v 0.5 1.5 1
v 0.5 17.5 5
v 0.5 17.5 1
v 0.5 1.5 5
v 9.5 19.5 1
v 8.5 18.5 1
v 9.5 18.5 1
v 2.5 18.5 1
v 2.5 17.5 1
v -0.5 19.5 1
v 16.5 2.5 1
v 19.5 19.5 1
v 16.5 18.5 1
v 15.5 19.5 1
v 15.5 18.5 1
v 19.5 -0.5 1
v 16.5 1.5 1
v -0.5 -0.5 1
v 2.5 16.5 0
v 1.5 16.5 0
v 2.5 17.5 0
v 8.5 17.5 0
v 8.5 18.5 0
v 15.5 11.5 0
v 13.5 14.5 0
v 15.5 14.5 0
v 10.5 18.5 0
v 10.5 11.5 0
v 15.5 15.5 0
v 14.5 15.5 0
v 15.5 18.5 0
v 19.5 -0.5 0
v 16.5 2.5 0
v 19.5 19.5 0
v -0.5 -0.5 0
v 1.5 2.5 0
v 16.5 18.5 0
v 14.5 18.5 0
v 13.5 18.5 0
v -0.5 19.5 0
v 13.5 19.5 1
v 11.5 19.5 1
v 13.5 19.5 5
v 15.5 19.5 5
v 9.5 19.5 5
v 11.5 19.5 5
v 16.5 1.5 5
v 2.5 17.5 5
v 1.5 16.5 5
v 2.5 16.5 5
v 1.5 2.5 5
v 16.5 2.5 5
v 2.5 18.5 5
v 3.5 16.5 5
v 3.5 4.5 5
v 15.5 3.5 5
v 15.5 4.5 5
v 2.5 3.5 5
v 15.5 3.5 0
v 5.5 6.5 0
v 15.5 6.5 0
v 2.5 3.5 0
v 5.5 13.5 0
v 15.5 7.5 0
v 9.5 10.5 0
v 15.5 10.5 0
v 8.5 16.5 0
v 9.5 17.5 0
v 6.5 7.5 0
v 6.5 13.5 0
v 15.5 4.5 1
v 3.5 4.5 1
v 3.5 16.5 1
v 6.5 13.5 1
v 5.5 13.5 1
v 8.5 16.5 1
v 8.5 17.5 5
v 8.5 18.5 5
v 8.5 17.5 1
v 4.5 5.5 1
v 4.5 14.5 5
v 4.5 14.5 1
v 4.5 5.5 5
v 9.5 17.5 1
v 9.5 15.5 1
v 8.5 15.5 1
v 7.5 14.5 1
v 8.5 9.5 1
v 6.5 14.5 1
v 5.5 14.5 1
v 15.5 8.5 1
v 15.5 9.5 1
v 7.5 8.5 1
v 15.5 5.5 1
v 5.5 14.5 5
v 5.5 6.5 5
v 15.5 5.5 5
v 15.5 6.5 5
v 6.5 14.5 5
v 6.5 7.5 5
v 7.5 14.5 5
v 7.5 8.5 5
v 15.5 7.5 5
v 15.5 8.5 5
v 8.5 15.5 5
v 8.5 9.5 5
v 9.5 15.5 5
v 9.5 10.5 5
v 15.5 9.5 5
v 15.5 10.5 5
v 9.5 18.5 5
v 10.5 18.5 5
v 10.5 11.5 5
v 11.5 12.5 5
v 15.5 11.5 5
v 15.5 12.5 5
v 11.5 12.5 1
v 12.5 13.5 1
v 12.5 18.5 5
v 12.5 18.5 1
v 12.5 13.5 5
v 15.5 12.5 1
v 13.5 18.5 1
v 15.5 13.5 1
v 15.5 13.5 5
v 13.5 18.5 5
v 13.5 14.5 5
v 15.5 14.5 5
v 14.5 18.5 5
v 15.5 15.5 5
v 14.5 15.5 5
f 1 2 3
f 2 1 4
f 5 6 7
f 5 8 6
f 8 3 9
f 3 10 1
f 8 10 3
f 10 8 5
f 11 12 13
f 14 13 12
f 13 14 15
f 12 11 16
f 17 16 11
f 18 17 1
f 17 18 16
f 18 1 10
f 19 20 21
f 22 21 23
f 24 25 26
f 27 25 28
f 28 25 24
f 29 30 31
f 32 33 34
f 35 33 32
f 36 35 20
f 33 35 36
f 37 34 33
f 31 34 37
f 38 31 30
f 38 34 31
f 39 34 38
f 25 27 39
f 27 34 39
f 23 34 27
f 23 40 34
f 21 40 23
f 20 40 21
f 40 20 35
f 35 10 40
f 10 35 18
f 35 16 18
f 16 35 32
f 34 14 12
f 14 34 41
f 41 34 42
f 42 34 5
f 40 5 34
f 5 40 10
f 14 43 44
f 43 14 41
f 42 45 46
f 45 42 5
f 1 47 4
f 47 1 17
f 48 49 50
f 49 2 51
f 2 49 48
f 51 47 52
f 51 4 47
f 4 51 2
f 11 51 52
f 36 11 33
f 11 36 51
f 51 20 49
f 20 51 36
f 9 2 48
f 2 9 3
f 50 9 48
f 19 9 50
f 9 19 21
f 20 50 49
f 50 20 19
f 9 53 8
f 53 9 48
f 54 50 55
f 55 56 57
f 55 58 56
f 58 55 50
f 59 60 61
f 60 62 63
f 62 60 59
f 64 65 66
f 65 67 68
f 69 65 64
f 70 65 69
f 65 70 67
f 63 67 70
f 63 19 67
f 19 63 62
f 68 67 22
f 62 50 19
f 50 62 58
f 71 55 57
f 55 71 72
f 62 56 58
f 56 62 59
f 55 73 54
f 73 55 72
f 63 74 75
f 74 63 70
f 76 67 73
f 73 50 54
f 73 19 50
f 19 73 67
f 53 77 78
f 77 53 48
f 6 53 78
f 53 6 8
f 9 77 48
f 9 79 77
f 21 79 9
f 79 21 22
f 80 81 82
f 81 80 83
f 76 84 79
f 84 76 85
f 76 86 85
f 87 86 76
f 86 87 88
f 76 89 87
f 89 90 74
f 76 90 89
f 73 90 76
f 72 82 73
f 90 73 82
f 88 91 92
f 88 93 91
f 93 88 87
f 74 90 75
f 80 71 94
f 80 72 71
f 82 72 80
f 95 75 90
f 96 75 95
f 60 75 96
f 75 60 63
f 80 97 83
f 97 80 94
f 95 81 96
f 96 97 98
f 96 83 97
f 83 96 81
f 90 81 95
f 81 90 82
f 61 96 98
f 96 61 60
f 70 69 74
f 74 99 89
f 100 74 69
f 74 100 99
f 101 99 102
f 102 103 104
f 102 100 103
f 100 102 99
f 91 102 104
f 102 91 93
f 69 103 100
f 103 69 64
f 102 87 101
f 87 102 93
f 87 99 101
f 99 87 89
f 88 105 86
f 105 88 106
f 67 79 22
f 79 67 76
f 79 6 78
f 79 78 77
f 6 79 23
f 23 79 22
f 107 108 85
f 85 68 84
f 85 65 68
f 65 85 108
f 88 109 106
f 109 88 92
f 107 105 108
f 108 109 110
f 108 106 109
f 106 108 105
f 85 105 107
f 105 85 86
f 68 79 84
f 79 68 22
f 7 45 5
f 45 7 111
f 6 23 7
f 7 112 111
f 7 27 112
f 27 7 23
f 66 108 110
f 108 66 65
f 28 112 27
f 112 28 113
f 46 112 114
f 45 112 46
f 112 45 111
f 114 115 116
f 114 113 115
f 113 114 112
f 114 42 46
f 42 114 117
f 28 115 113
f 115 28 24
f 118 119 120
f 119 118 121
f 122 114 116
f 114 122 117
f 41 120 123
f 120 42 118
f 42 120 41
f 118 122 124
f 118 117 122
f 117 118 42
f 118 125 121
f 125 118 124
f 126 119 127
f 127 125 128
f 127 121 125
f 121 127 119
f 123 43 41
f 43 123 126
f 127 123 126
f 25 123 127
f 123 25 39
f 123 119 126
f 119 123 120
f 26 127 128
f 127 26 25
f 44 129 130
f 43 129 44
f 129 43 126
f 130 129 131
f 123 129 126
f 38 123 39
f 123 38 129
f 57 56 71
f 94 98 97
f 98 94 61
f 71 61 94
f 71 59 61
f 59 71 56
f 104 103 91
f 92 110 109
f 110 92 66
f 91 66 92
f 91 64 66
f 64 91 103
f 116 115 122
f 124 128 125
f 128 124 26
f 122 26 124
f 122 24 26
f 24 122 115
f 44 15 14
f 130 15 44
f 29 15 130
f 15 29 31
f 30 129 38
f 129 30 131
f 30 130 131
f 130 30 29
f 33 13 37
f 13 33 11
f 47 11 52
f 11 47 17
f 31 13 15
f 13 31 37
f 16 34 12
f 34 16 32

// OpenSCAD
union() {
    translate([0, 0, 0.5]) cube([1, 1, 1], center=true);
    translate([0, 1, 0.5]) cube([1, 1, 1], center=true);
    translate([0, 2, 0.5]) cube([1, 1, 1], center=true);
    translate([0, 3, 0.5]) cube([1, 1, 1], center=true);
    translate([0, 4, 0.5]) cube([1, 1, 1], center=true);
    translate([0, 5, 0.5]) cube([1, 1, 1], center=true);
    translate([0, 6, 0.5]) cube([1, 1, 1], center=true);
    translate([0, 7, 0.5]) cube([1, 1, 1], center=true);
    translate([0, 8, 0.5]) cube([1, 1, 1], center=true);
    translate([0, 9, 0.5]) cube([1, 1, 1], center=true);
    translate([0, 10, 0.5]) cube([1, 1, 1], center=true);
    translate([0, 11, 0.5]) cube([1, 1, 1], center=true);
    translate([0, 12, 0.5]) cube([1, 1, 1], center=true);
    translate([0, 13, 0.5]) cube([1, 1, 1], center=true);
    translate([0, 14, 0.5]) cube([1, 1, 1], center=true);
    translate([0, 15, 0.5]) cube([1, 1, 1], center=true);
    translate([0, 16, 0.5]) cube([1, 1, 1], center=true);
    translate([0, 17, 0.5]) cube([1, 1, 1], center=true);
    translate([0, 18, 0.5]) cube([1, 1, 1], center=true);
    translate([0, 19, 0.5]) cube([1, 1, 1], center=true);
    translate([1, 0, 0.5]) cube([1, 1, 1], center=true);
    translate([1, 1, 0.5]) cube([1, 1, 1], center=true);
    translate([1, 2, 2.5]) cube([1, 1, 5], center=true);
    translate([1, 3, 2.5]) cube([1, 1, 5], center=true);
    translate([1, 4, 2.5]) cube([1, 1, 5], center=true);
    translate([1, 5, 2.5]) cube([1, 1, 5], center=true);
    translate([1, 6, 2.5]) cube([1, 1, 5], center=true);
    translate([1, 7, 2.5]) cube([1, 1, 5], center=true);
    translate([1, 8, 2.5]) cube([1, 1, 5], center=true);
    translate([1, 9, 2.5]) cube([1, 1, 5], center=true);
    translate([1, 10, 2.5]) cube([1, 1, 5], center=true);
    translate([1, 11, 2.5]) cube([1, 1, 5], center=true);
    translate([1, 12, 2.5]) cube([1, 1, 5], center=true);
    translate([1, 13, 2.5]) cube([1, 1, 5], center=true);
    translate([1, 14, 2.5]) cube([1, 1, 5], center=true);
    translate([1, 15, 2.5]) cube([1, 1, 5], center=true);
    translate([1, 16, 2.5]) cube([1, 1, 5], center=true);
    translate([1, 17, 2.5]) cube([1, 1, 5], center=true);
    translate([1, 18, 0.5]) cube([1, 1, 1], center=true);
    translate([1, 19, 0.5]) cube([1, 1, 1], center=true);
    translate([2, 0, 0.5]) cube([1, 1, 1], center=true);
    translate([2, 1, 0.5]) cube([1, 1, 1], center=true);
    translate([2, 2, 2.5]) cube([1, 1, 5], center=true);
    translate([2, 17, 2.5]) cube([1, 1, 5], center=true);
    translate([2, 18, 0.5]) cube([1, 1, 1], center=true);
    translate([2, 19, 0.5]) cube([1, 1, 1], center=true);
    translate([3, 0, 0.5]) cube([1, 1, 1], center=true);
    translate([3, 1, 0.5]) cube([1, 1, 1], center=true);
    translate([3, 2, 2.5]) cube([1, 1, 5], center=true);
    translate([3, 4, 2.5]) cube([1, 1, 5], center=true);
    translate([3, 5, 2.5]) cube([1, 1, 5], center=true);
    translate([3, 6, 2.5]) cube([1, 1, 5], center=true);
    translate([3, 7, 2.5]) cube([1, 1, 5], center=true);
    translate([3, 8, 2.5]) cube([1, 1, 5], center=true);
    translate([3, 9, 2.5]) cube([1, 1, 5], center=true);
    translate([3, 10, 2.5]) cube([1, 1, 5], center=true);
    translate([3, 11, 2.5]) cube([1, 1, 5], center=true);
    translate([3, 12, 2.5]) cube([1, 1, 5], center=true);
    translate([3, 13, 2.5]) cube([1, 1, 5], center=true);
    translate([3, 14, 2.5]) cube([1, 1, 5], center=true);
    translate([3, 15, 2.5]) cube([1, 1, 5], center=true);
    translate([3, 16, 2.5]) cube([1, 1, 5], center=true);
    translate([3, 18, 2.5]) cube([1, 1, 5], center=true);
    translate([3, 19, 0.5]) cube([1, 1, 1], center=true);
    translate([4, 0, 0.5]) cube([1, 1, 1], center=true);
    translate([4, 1, 0.5]) cube([1, 1, 1], center=true);
    translate([4, 2, 2.5]) cube([1, 1, 5], center=true);
    translate([4, 4, 2.5]) cube([1, 1, 5], center=true);
    translate([4, 5, 0.5]) cube([1, 1, 1], center=true);
    translate([4, 6, 0.5]) cube([1, 1, 1], center=true);
    translate([4, 7, 0.5]) cube([1, 1, 1], center=true);
    translate([4, 8, 0.5]) cube([1, 1, 1], center=true);
    translate([4, 9, 0.5]) cube([1, 1, 1], center=true);
    translate([4, 10, 0.5]) cube([1, 1, 1], center=true);
    translate([4, 11, 0.5]) cube([1, 1, 1], center=true);
    translate([4, 12, 0.5]) cube([1, 1, 1], center=true);
    translate([4, 13, 0.5]) cube([1, 1, 1], center=true);
    translate([4, 14, 0.5]) cube([1, 1, 1], center=true);
    translate([4, 15, 0.5]) cube([1, 1, 1], center=true);
    translate([4, 16, 0.5]) cube([1, 1, 1], center=true);
    translate([4, 18, 2.5]) cube([1, 1, 5], center=true);
    translate([4, 19, 0.5]) cube([1, 1, 1], center=true);
    translate([5, 0, 0.5]) cube([1, 1, 1], center=true);
    translate([5, 1, 0.5]) cube([1, 1, 1], center=true);
    translate([5, 2, 2.5]) cube([1, 1, 5], center=true);
    translate([5, 4, 2.5]) cube([1, 1, 5], center=true);
    translate([5, 5, 0.5]) cube([1, 1, 1], center=true);
    translate([5, 6, 2.5]) cube([1, 1, 5], center=true);
    translate([5, 7, 2.5]) cube([1, 1, 5], center=true);
    translate([5, 8, 2.5]) cube([1, 1, 5], center=true);
    translate([5, 9, 2.5]) cube([1, 1, 5], center=true);
    translate([5, 10, 2.5]) cube([1, 1, 5], center=true);
    translate([5, 11, 2.5]) cube([1, 1, 5], center=true);
    translate([5, 12, 2.5]) cube([1, 1, 5], center=true);
    translate([5, 13, 2.5]) cube([1, 1, 5], center=true);
    translate([5, 14, 2.5]) cube([1, 1, 5], center=true);
    translate([5, 15, 0.5]) cube([1, 1, 1], center=true);
    translate([5, 16, 0.5]) cube([1, 1, 1], center=true);
    translate([5, 18, 2.5]) cube([1, 1, 5], center=true);
    translate([5, 19, 0.5]) cube([1, 1, 1], center=true);
    translate([6, 0, 0.5]) cube([1, 1, 1], center=true);
    translate([6, 1, 0.5]) cube([1, 1, 1], center=true);
    translate([6, 2, 2.5]) cube([1, 1, 5], center=true);
    translate([6, 4, 2.5]) cube([1, 1, 5], center=true);
    translate([6, 5, 0.5]) cube([1, 1, 1], center=true);
    translate([6, 6, 2.5]) cube([1, 1, 5], center=true);
    translate([6, 14, 0.5]) cube([1, 1, 1], center=true);
    translate([6, 15, 0.5]) cube([1, 1, 1], center=true);
    translate([6, 16, 0.5]) cube([1, 1, 1], center=true);
    translate([6, 18, 2.5]) cube([1, 1, 5], center=true);
    translate([6, 19, 0.5]) cube([1, 1, 1], center=true);
    translate([7, 0, 0.5]) cube([1, 1, 1], center=true);
    translate([7, 1, 0.5]) cube([1, 1, 1], center=true);
    translate([7, 2, 2.5]) cube([1, 1, 5], center=true);
    translate([7, 4, 2.5]) cube([1, 1, 5], center=true);
    translate([7, 5, 0.5]) cube([1, 1, 1], center=true);
    translate([7, 6, 2.5]) cube([1, 1, 5], center=true);
    translate([7, 8, 2.5]) cube([1, 1, 5], center=true);
    translate([7, 9, 2.5]) cube([1, 1, 5], center=true);
    translate([7, 10, 2.5]) cube([1, 1, 5], center=true);
    translate([7, 11, 2.5]) cube([1, 1, 5], center=true);
    translate([7, 12, 2.5]) cube([1, 1, 5], center=true);
    translate([7, 13, 2.5]) cube([1, 1, 5], center=true);
    translate([7, 14, 2.5]) cube([1, 1, 5], center=true);
    translate([7, 15, 0.5]) cube([1, 1, 1], center=true);
    translate([7, 16, 0.5]) cube([1, 1, 1], center=true);
    translate([7, 18, 2.5]) cube([1, 1, 5], center=true);
    translate([7, 19, 0.5]) cube([1, 1, 1], center=true);
    translate([8, 0, 0.5]) cube([1, 1, 1], center=true);
    translate([8, 1, 0.5]) cube([1, 1, 1], center=true);
    translate([8, 2, 2.5]) cube([1, 1, 5], center=true);
    translate([8, 4, 2.5]) cube([1, 1, 5], center=true);
    translate([8, 5, 0.5]) cube([1, 1, 1], center=true);
    translate([8, 6, 2.5]) cube([1, 1, 5], center=true);
    translate([8, 8, 2.5]) cube([1, 1, 5], center=true);
    translate([8, 9, 0.5]) cube([1, 1, 1], center=true);
    translate([8, 10, 0.5]) cube([1, 1, 1], center=true);
    translate([8, 11, 0.5]) cube([1, 1, 1], center=true);
    translate([8, 12, 0.5]) cube([1, 1, 1], center=true);
    translate([8, 13, 0.5]) cube([1, 1, 1], center=true);
    translate([8, 14, 0.5]) cube([1, 1, 1], center=true);
    translate([8, 15, 0.5]) cube([1, 1, 1], center=true);
    translate([8, 16, 0.5]) cube([1, 1, 1], center=true);
    translate([8, 18, 2.5]) cube([1, 1, 5], center=true);
    translate([8, 19, 0.5]) cube([1, 1, 1], center=true);
    translate([9, 0, 0.5]) cube([1, 1, 1], center=true);
    translate([9, 1, 0.5]) cube([1, 1, 1], center=true);
    translate([9, 2, 2.5]) cube([1, 1, 5], center=true);
    translate([9, 4, 2.5]) cube([1, 1, 5], center=true);
    translate([9, 5, 0.5]) cube([1, 1, 1], center=true);
    translate([9, 6, 2.5]) cube([1, 1, 5], center=true);
    translate([9, 8, 2.5]) cube([1, 1, 5], center=true);
    translate([9, 9, 0.5]) cube([1, 1, 1], center=true);
    translate([9, 10, 2.5]) cube([1, 1, 5], center=true);
    translate([9, 11, 2.5]) cube([1, 1, 5], center=true);
    translate([9, 12, 2.5]) cube([1, 1, 5], center=true);
    translate([9, 13, 2.5]) cube([1, 1, 5], center=true);
    translate([9, 14, 2.5]) cube([1, 1, 5], center=true);
    translate([9, 15, 2.5]) cube([1, 1, 5], center=true);
    translate([9, 16, 0.5]) cube([1, 1, 1], center=true);
    translate([9, 17, 0.5]) cube([1, 1, 1], center=true);
    translate([9, 19, 0.5]) cube([1, 1, 1], center=true);
    translate([10, 0, 0.5]) cube([1, 1, 1], center=true);
    translate([10, 1, 0.5]) cube([1, 1, 1], center=true);
    translate([10, 2, 2.5]) cube([1, 1, 5], center=true);
    translate([10, 4, 2.5]) cube([1, 1, 5], center=true);
    translate([10, 5, 0.5]) cube([1, 1, 1], center=true);
    translate([10, 6, 2.5]) cube([1, 1, 5], center=true);
    translate([10, 8, 2.5]) cube([1, 1, 5], center=true);
    translate([10, 9, 0.5]) cube([1, 1, 1], center=true);
    translate([10, 10, 2.5]) cube([1, 1, 5], center=true);
    translate([10, 19, 2.5]) cube([1, 1, 5], center=true);
    translate([11, 0, 0.5]) cube([1, 1, 1], center=true);
    translate([11, 1, 0.5]) cube([1, 1, 1], center=true);
    translate([11, 2, 2.5]) cube([1, 1, 5], center=true);
    translate([11, 4, 2.5]) cube([1, 1, 5], center=true);
    translate([11, 5, 0.5]) cube([1, 1, 1], center=true);
    translate([11, 6, 2.5]) cube([1, 1, 5], center=true);
    translate([11, 8, 2.5]) cube([1, 1, 5], center=true);
    translate([11, 9, 0.5]) cube([1, 1, 1], center=true);
    translate([11, 10, 2.5]) cube([1, 1, 5], center=true);
    translate([11, 12, 2.5]) cube([1, 1, 5], center=true);
    translate([11, 13, 2.5]) cube([1, 1, 5], center=true);
    translate([11, 14, 2.5]) cube([1, 1, 5], center=true);
    translate([11, 15, 2.5]) cube([1, 1, 5], center=true);
    translate([11, 16, 2.5]) cube([1, 1, 5], center=true);
    translate([11, 17, 2.5]) cube([1, 1, 5], center=true);
    translate([11, 18, 2.5]) cube([1, 1, 5], center=true);
    translate([11, 19, 2.5]) cube([1, 1, 5], center=true);
    translate([12, 0, 0.5]) cube([1, 1, 1], center=true);
    translate([12, 1, 0.5]) cube([1, 1, 1], center=true);
    translate([12, 2, 2.5]) cube([1, 1, 5], center=true);
    translate([12, 4, 2.5]) cube([1, 1, 5], center=true);
    translate([12, 5, 0.5]) cube([1, 1, 1], center=true);
    translate([12, 6, 2.5]) cube([1, 1, 5], center=true);
    translate([12, 8, 2.5]) cube([1, 1, 5], center=true);
    translate([12, 9, 0.5]) cube([1, 1, 1], center=true);
    translate([12, 10, 2.5]) cube([1, 1, 5], center=true);
    translate([12, 12, 2.5]) cube([1, 1, 5], center=true);
    translate([12, 13, 0.5]) cube([1, 1, 1], center=true);
    translate([12, 14, 0.5]) cube([1, 1, 1], center=true);
    translate([12, 15, 0.5]) cube([1, 1, 1], center=true);
    translate([12, 16, 0.5]) cube([1, 1, 1], center=true);
    translate([12, 17, 0.5]) cube([1, 1, 1], center=true);
    translate([12, 18, 0.5]) cube([1, 1, 1], center=true);
    translate([12, 19, 0.5]) cube([1, 1, 1], center=true);
    translate([13, 0, 0.5]) cube([1, 1, 1], center=true);
    translate([13, 1, 0.5]) cube([1, 1, 1], center=true);
    translate([13, 2, 2.5]) cube([1, 1, 5], center=true);
    translate([13, 4, 2.5]) cube([1, 1, 5], center=true);
    translate([13, 5, 0.5]) cube([1, 1, 1], center=true);
    translate([13, 6, 2.5]) cube([1, 1, 5], center=true);
    translate([13, 8, 2.5]) cube([1, 1, 5], center=true);
    translate([13, 9, 0.5]) cube([1, 1, 1], center=true);
    translate([13, 10, 2.5]) cube([1, 1, 5], center=true);
    translate([13, 12, 2.5]) cube([1, 1, 5], center=true);
    translate([13, 13, 0.5]) cube([1, 1, 1], center=true);
    translate([13, 14, 2.5]) cube([1, 1, 5], center=true);
    translate([13, 15, 2.5]) cube([1, 1, 5], center=true);
    translate([13, 16, 2.5]) cube([1, 1, 5], center=true);
    translate([13, 17, 2.5]) cube([1, 1, 5], center=true);
    translate([13, 18, 2.5]) cube([1, 1, 5], center=true);
    translate([13, 19, 0.5]) cube([1, 1, 1], center=true);
    translate([14, 0, 0.5]) cube([1, 1, 1], center=true);
    translate([14, 1, 0.5]) cube([1, 1, 1], center=true);
    translate([14, 2, 2.5]) cube([1, 1, 5], center=true);
    translate([14, 4, 2.5]) cube([1, 1, 5], center=true);
    translate([14, 5, 0.5]) cube([1, 1, 1], center=true);
    translate([14, 6, 2.5]) cube([1, 1, 5], center=true);
    translate([14, 8, 2.5]) cube([1, 1, 5], center=true);
    translate([14, 9, 0.5]) cube([1, 1, 1], center=true);
    translate([14, 10, 2.5]) cube([1, 1, 5], center=true);
    translate([14, 12, 2.5]) cube([1, 1, 5], center=true);
    translate([14, 13, 0.5]) cube([1, 1, 1], center=true);
    translate([14, 14, 2.5]) cube([1, 1, 5], center=true);
    translate([14, 19, 2.5]) cube([1, 1, 5], center=true);
    translate([15, 0, 0.5]) cube([1, 1, 1], center=true);
    translate([15, 1, 0.5]) cube([1, 1, 1], center=true);
    translate([15, 2, 2.5]) cube([1, 1, 5], center=true);
    translate([15, 4, 2.5]) cube([1, 1, 5], center=true);
    translate([15, 5, 0.5]) cube([1, 1, 1], center=true);
    translate([15, 6, 2.5]) cube([1, 1, 5], center=true);
    translate([15, 8, 2.5]) cube([1, 1, 5], center=true);
    translate([15, 9, 0.5]) cube([1, 1, 1], center=true);
    translate([15, 10, 2.5]) cube([1, 1, 5], center=true);
    translate([15, 12, 2.5]) cube([1, 1, 5], center=true);
    translate([15, 13, 0.5]) cube([1, 1, 1], center=true);
    translate([15, 14, 2.5]) cube([1, 1, 5], center=true);
    translate([15, 16, 2.5]) cube([1, 1, 5], center=true);
    translate([15, 17, 2.5]) cube([1, 1, 5], center=true);
    translate([15, 18, 2.5]) cube([1, 1, 5], center=true);
    translate([15, 19, 2.5]) cube([1, 1, 5], center=true);
    translate([16, 0, 0.5]) cube([1, 1, 1], center=true);
    translate([16, 1, 0.5]) cube([1, 1, 1], center=true);
    translate([16, 2, 2.5]) cube([1, 1, 5], center=true);
    translate([16, 19, 0.5]) cube([1, 1, 1], center=true);
    translate([17, 0, 0.5]) cube([1, 1, 1], center=true);
    translate([17, 1, 0.5]) cube([1, 1, 1], center=true);
    translate([17, 2, 0.5]) cube([1, 1, 1], center=true);
    translate([17, 3, 0.5]) cube([1, 1, 1], center=true);
    translate([17, 4, 0.5]) cube([1, 1, 1], center=true);
    translate([17, 5, 0.5]) cube([1, 1, 1], center=true);
    translate([17, 6, 0.5]) cube([1, 1, 1], center=true);
    translate([17, 7, 0.5]) cube([1, 1, 1], center=true);
    translate([17, 8, 0.5]) cube([1, 1, 1], center=true);
    translate([17, 9, 0.5]) cube([1, 1, 1], center=true);
    translate([17, 10, 0.5]) cube([1, 1, 1], center=true);
    translate([17, 11, 0.5]) cube([1, 1, 1], center=true);
    translate([17, 12, 0.5]) cube([1, 1, 1], center=true);
    translate([17, 13, 0.5]) cube([1, 1, 1], center=true);
    translate([17, 14, 0.5]) cube([1, 1, 1], center=true);
    translate([17, 15, 0.5]) cube([1, 1, 1], center=true);
    translate([17, 16, 0.5]) cube([1, 1, 1], center=true);
    translate([17, 17, 0.5]) cube([1, 1, 1], center=true);
    translate([17, 18, 0.5]) cube([1, 1, 1], center=true);
    translate([17, 19, 0.5]) cube([1, 1, 1], center=true);
    translate([18, 0, 0.5]) cube([1, 1, 1], center=true);
    translate([18, 1, 0.5]) cube([1, 1, 1], center=true);
    translate([18, 2, 0.5]) cube([1, 1, 1], center=true);
    translate([18, 3, 0.5]) cube([1, 1, 1], center=true);
    translate([18, 4, 0.5]) cube([1, 1, 1], center=true);
    translate([18, 5, 0.5]) cube([1, 1, 1], center=true);
    translate([18, 6, 0.5]) cube([1, 1, 1], center=true);
    translate([18, 7, 0.5]) cube([1, 1, 1], center=true);
    translate([18, 8, 0.5]) cube([1, 1, 1], center=true);
    translate([18, 9, 0.5]) cube([1, 1, 1], center=true);
    translate([18, 10, 0.5]) cube([1, 1, 1], center=true);
    translate([18, 11, 0.5]) cube([1, 1, 1], center=true);
    translate([18, 12, 0.5]) cube([1, 1, 1], center=true);
    translate([18, 13, 0.5]) cube([1, 1, 1], center=true);
    translate([18, 14, 0.5]) cube([1, 1, 1], center=true);
    translate([18, 15, 0.5]) cube([1, 1, 1], center=true);
    translate([18, 16, 0.5]) cube([1, 1, 1], center=true);
    translate([18, 17, 0.5]) cube([1, 1, 1], center=true);
    translate([18, 18, 0.5]) cube([1, 1, 1], center=true);
    translate([18, 19, 0.5]) cube([1, 1, 1], center=true);
    translate([19, 0, 0.5]) cube([1, 1, 1], center=true);
    translate([19, 1, 0.5]) cube([1, 1, 1], center=true);
    translate([19, 2, 0.5]) cube([1, 1, 1], center=true);
    translate([19, 3, 0.5]) cube([1, 1, 1], center=true);
    translate([19, 4, 0.5]) cube([1, 1, 1], center=true);
    translate([19, 5, 0.5]) cube([1, 1, 1], center=true);
    translate([19, 6, 0.5]) cube([1, 1, 1], center=true);
    translate([19, 7, 0.5]) cube([1, 1, 1], center=true);
    translate([19, 8, 0.5]) cube([1, 1, 1], center=true);
    translate([19, 9, 0.5]) cube([1, 1, 1], center=true);
    translate([19, 10, 0.5]) cube([1, 1, 1], center=true);
    translate([19, 11, 0.5]) cube([1, 1, 1], center=true);
    translate([19, 12, 0.5]) cube([1, 1, 1], center=true);
    translate([19, 13, 0.5]) cube([1, 1, 1], center=true);
    translate([19, 14, 0.5]) cube([1, 1, 1], center=true);
    translate([19, 15, 0.5]) cube([1, 1, 1], center=true);
    translate([19, 16, 0.5]) cube([1, 1, 1], center=true);
    translate([19, 17, 0.5]) cube([1, 1, 1], center=true);
    translate([19, 18, 0.5]) cube([1, 1, 1], center=true);
    translate([19, 19, 0.5]) cube([1, 1, 1], center=true);
}
